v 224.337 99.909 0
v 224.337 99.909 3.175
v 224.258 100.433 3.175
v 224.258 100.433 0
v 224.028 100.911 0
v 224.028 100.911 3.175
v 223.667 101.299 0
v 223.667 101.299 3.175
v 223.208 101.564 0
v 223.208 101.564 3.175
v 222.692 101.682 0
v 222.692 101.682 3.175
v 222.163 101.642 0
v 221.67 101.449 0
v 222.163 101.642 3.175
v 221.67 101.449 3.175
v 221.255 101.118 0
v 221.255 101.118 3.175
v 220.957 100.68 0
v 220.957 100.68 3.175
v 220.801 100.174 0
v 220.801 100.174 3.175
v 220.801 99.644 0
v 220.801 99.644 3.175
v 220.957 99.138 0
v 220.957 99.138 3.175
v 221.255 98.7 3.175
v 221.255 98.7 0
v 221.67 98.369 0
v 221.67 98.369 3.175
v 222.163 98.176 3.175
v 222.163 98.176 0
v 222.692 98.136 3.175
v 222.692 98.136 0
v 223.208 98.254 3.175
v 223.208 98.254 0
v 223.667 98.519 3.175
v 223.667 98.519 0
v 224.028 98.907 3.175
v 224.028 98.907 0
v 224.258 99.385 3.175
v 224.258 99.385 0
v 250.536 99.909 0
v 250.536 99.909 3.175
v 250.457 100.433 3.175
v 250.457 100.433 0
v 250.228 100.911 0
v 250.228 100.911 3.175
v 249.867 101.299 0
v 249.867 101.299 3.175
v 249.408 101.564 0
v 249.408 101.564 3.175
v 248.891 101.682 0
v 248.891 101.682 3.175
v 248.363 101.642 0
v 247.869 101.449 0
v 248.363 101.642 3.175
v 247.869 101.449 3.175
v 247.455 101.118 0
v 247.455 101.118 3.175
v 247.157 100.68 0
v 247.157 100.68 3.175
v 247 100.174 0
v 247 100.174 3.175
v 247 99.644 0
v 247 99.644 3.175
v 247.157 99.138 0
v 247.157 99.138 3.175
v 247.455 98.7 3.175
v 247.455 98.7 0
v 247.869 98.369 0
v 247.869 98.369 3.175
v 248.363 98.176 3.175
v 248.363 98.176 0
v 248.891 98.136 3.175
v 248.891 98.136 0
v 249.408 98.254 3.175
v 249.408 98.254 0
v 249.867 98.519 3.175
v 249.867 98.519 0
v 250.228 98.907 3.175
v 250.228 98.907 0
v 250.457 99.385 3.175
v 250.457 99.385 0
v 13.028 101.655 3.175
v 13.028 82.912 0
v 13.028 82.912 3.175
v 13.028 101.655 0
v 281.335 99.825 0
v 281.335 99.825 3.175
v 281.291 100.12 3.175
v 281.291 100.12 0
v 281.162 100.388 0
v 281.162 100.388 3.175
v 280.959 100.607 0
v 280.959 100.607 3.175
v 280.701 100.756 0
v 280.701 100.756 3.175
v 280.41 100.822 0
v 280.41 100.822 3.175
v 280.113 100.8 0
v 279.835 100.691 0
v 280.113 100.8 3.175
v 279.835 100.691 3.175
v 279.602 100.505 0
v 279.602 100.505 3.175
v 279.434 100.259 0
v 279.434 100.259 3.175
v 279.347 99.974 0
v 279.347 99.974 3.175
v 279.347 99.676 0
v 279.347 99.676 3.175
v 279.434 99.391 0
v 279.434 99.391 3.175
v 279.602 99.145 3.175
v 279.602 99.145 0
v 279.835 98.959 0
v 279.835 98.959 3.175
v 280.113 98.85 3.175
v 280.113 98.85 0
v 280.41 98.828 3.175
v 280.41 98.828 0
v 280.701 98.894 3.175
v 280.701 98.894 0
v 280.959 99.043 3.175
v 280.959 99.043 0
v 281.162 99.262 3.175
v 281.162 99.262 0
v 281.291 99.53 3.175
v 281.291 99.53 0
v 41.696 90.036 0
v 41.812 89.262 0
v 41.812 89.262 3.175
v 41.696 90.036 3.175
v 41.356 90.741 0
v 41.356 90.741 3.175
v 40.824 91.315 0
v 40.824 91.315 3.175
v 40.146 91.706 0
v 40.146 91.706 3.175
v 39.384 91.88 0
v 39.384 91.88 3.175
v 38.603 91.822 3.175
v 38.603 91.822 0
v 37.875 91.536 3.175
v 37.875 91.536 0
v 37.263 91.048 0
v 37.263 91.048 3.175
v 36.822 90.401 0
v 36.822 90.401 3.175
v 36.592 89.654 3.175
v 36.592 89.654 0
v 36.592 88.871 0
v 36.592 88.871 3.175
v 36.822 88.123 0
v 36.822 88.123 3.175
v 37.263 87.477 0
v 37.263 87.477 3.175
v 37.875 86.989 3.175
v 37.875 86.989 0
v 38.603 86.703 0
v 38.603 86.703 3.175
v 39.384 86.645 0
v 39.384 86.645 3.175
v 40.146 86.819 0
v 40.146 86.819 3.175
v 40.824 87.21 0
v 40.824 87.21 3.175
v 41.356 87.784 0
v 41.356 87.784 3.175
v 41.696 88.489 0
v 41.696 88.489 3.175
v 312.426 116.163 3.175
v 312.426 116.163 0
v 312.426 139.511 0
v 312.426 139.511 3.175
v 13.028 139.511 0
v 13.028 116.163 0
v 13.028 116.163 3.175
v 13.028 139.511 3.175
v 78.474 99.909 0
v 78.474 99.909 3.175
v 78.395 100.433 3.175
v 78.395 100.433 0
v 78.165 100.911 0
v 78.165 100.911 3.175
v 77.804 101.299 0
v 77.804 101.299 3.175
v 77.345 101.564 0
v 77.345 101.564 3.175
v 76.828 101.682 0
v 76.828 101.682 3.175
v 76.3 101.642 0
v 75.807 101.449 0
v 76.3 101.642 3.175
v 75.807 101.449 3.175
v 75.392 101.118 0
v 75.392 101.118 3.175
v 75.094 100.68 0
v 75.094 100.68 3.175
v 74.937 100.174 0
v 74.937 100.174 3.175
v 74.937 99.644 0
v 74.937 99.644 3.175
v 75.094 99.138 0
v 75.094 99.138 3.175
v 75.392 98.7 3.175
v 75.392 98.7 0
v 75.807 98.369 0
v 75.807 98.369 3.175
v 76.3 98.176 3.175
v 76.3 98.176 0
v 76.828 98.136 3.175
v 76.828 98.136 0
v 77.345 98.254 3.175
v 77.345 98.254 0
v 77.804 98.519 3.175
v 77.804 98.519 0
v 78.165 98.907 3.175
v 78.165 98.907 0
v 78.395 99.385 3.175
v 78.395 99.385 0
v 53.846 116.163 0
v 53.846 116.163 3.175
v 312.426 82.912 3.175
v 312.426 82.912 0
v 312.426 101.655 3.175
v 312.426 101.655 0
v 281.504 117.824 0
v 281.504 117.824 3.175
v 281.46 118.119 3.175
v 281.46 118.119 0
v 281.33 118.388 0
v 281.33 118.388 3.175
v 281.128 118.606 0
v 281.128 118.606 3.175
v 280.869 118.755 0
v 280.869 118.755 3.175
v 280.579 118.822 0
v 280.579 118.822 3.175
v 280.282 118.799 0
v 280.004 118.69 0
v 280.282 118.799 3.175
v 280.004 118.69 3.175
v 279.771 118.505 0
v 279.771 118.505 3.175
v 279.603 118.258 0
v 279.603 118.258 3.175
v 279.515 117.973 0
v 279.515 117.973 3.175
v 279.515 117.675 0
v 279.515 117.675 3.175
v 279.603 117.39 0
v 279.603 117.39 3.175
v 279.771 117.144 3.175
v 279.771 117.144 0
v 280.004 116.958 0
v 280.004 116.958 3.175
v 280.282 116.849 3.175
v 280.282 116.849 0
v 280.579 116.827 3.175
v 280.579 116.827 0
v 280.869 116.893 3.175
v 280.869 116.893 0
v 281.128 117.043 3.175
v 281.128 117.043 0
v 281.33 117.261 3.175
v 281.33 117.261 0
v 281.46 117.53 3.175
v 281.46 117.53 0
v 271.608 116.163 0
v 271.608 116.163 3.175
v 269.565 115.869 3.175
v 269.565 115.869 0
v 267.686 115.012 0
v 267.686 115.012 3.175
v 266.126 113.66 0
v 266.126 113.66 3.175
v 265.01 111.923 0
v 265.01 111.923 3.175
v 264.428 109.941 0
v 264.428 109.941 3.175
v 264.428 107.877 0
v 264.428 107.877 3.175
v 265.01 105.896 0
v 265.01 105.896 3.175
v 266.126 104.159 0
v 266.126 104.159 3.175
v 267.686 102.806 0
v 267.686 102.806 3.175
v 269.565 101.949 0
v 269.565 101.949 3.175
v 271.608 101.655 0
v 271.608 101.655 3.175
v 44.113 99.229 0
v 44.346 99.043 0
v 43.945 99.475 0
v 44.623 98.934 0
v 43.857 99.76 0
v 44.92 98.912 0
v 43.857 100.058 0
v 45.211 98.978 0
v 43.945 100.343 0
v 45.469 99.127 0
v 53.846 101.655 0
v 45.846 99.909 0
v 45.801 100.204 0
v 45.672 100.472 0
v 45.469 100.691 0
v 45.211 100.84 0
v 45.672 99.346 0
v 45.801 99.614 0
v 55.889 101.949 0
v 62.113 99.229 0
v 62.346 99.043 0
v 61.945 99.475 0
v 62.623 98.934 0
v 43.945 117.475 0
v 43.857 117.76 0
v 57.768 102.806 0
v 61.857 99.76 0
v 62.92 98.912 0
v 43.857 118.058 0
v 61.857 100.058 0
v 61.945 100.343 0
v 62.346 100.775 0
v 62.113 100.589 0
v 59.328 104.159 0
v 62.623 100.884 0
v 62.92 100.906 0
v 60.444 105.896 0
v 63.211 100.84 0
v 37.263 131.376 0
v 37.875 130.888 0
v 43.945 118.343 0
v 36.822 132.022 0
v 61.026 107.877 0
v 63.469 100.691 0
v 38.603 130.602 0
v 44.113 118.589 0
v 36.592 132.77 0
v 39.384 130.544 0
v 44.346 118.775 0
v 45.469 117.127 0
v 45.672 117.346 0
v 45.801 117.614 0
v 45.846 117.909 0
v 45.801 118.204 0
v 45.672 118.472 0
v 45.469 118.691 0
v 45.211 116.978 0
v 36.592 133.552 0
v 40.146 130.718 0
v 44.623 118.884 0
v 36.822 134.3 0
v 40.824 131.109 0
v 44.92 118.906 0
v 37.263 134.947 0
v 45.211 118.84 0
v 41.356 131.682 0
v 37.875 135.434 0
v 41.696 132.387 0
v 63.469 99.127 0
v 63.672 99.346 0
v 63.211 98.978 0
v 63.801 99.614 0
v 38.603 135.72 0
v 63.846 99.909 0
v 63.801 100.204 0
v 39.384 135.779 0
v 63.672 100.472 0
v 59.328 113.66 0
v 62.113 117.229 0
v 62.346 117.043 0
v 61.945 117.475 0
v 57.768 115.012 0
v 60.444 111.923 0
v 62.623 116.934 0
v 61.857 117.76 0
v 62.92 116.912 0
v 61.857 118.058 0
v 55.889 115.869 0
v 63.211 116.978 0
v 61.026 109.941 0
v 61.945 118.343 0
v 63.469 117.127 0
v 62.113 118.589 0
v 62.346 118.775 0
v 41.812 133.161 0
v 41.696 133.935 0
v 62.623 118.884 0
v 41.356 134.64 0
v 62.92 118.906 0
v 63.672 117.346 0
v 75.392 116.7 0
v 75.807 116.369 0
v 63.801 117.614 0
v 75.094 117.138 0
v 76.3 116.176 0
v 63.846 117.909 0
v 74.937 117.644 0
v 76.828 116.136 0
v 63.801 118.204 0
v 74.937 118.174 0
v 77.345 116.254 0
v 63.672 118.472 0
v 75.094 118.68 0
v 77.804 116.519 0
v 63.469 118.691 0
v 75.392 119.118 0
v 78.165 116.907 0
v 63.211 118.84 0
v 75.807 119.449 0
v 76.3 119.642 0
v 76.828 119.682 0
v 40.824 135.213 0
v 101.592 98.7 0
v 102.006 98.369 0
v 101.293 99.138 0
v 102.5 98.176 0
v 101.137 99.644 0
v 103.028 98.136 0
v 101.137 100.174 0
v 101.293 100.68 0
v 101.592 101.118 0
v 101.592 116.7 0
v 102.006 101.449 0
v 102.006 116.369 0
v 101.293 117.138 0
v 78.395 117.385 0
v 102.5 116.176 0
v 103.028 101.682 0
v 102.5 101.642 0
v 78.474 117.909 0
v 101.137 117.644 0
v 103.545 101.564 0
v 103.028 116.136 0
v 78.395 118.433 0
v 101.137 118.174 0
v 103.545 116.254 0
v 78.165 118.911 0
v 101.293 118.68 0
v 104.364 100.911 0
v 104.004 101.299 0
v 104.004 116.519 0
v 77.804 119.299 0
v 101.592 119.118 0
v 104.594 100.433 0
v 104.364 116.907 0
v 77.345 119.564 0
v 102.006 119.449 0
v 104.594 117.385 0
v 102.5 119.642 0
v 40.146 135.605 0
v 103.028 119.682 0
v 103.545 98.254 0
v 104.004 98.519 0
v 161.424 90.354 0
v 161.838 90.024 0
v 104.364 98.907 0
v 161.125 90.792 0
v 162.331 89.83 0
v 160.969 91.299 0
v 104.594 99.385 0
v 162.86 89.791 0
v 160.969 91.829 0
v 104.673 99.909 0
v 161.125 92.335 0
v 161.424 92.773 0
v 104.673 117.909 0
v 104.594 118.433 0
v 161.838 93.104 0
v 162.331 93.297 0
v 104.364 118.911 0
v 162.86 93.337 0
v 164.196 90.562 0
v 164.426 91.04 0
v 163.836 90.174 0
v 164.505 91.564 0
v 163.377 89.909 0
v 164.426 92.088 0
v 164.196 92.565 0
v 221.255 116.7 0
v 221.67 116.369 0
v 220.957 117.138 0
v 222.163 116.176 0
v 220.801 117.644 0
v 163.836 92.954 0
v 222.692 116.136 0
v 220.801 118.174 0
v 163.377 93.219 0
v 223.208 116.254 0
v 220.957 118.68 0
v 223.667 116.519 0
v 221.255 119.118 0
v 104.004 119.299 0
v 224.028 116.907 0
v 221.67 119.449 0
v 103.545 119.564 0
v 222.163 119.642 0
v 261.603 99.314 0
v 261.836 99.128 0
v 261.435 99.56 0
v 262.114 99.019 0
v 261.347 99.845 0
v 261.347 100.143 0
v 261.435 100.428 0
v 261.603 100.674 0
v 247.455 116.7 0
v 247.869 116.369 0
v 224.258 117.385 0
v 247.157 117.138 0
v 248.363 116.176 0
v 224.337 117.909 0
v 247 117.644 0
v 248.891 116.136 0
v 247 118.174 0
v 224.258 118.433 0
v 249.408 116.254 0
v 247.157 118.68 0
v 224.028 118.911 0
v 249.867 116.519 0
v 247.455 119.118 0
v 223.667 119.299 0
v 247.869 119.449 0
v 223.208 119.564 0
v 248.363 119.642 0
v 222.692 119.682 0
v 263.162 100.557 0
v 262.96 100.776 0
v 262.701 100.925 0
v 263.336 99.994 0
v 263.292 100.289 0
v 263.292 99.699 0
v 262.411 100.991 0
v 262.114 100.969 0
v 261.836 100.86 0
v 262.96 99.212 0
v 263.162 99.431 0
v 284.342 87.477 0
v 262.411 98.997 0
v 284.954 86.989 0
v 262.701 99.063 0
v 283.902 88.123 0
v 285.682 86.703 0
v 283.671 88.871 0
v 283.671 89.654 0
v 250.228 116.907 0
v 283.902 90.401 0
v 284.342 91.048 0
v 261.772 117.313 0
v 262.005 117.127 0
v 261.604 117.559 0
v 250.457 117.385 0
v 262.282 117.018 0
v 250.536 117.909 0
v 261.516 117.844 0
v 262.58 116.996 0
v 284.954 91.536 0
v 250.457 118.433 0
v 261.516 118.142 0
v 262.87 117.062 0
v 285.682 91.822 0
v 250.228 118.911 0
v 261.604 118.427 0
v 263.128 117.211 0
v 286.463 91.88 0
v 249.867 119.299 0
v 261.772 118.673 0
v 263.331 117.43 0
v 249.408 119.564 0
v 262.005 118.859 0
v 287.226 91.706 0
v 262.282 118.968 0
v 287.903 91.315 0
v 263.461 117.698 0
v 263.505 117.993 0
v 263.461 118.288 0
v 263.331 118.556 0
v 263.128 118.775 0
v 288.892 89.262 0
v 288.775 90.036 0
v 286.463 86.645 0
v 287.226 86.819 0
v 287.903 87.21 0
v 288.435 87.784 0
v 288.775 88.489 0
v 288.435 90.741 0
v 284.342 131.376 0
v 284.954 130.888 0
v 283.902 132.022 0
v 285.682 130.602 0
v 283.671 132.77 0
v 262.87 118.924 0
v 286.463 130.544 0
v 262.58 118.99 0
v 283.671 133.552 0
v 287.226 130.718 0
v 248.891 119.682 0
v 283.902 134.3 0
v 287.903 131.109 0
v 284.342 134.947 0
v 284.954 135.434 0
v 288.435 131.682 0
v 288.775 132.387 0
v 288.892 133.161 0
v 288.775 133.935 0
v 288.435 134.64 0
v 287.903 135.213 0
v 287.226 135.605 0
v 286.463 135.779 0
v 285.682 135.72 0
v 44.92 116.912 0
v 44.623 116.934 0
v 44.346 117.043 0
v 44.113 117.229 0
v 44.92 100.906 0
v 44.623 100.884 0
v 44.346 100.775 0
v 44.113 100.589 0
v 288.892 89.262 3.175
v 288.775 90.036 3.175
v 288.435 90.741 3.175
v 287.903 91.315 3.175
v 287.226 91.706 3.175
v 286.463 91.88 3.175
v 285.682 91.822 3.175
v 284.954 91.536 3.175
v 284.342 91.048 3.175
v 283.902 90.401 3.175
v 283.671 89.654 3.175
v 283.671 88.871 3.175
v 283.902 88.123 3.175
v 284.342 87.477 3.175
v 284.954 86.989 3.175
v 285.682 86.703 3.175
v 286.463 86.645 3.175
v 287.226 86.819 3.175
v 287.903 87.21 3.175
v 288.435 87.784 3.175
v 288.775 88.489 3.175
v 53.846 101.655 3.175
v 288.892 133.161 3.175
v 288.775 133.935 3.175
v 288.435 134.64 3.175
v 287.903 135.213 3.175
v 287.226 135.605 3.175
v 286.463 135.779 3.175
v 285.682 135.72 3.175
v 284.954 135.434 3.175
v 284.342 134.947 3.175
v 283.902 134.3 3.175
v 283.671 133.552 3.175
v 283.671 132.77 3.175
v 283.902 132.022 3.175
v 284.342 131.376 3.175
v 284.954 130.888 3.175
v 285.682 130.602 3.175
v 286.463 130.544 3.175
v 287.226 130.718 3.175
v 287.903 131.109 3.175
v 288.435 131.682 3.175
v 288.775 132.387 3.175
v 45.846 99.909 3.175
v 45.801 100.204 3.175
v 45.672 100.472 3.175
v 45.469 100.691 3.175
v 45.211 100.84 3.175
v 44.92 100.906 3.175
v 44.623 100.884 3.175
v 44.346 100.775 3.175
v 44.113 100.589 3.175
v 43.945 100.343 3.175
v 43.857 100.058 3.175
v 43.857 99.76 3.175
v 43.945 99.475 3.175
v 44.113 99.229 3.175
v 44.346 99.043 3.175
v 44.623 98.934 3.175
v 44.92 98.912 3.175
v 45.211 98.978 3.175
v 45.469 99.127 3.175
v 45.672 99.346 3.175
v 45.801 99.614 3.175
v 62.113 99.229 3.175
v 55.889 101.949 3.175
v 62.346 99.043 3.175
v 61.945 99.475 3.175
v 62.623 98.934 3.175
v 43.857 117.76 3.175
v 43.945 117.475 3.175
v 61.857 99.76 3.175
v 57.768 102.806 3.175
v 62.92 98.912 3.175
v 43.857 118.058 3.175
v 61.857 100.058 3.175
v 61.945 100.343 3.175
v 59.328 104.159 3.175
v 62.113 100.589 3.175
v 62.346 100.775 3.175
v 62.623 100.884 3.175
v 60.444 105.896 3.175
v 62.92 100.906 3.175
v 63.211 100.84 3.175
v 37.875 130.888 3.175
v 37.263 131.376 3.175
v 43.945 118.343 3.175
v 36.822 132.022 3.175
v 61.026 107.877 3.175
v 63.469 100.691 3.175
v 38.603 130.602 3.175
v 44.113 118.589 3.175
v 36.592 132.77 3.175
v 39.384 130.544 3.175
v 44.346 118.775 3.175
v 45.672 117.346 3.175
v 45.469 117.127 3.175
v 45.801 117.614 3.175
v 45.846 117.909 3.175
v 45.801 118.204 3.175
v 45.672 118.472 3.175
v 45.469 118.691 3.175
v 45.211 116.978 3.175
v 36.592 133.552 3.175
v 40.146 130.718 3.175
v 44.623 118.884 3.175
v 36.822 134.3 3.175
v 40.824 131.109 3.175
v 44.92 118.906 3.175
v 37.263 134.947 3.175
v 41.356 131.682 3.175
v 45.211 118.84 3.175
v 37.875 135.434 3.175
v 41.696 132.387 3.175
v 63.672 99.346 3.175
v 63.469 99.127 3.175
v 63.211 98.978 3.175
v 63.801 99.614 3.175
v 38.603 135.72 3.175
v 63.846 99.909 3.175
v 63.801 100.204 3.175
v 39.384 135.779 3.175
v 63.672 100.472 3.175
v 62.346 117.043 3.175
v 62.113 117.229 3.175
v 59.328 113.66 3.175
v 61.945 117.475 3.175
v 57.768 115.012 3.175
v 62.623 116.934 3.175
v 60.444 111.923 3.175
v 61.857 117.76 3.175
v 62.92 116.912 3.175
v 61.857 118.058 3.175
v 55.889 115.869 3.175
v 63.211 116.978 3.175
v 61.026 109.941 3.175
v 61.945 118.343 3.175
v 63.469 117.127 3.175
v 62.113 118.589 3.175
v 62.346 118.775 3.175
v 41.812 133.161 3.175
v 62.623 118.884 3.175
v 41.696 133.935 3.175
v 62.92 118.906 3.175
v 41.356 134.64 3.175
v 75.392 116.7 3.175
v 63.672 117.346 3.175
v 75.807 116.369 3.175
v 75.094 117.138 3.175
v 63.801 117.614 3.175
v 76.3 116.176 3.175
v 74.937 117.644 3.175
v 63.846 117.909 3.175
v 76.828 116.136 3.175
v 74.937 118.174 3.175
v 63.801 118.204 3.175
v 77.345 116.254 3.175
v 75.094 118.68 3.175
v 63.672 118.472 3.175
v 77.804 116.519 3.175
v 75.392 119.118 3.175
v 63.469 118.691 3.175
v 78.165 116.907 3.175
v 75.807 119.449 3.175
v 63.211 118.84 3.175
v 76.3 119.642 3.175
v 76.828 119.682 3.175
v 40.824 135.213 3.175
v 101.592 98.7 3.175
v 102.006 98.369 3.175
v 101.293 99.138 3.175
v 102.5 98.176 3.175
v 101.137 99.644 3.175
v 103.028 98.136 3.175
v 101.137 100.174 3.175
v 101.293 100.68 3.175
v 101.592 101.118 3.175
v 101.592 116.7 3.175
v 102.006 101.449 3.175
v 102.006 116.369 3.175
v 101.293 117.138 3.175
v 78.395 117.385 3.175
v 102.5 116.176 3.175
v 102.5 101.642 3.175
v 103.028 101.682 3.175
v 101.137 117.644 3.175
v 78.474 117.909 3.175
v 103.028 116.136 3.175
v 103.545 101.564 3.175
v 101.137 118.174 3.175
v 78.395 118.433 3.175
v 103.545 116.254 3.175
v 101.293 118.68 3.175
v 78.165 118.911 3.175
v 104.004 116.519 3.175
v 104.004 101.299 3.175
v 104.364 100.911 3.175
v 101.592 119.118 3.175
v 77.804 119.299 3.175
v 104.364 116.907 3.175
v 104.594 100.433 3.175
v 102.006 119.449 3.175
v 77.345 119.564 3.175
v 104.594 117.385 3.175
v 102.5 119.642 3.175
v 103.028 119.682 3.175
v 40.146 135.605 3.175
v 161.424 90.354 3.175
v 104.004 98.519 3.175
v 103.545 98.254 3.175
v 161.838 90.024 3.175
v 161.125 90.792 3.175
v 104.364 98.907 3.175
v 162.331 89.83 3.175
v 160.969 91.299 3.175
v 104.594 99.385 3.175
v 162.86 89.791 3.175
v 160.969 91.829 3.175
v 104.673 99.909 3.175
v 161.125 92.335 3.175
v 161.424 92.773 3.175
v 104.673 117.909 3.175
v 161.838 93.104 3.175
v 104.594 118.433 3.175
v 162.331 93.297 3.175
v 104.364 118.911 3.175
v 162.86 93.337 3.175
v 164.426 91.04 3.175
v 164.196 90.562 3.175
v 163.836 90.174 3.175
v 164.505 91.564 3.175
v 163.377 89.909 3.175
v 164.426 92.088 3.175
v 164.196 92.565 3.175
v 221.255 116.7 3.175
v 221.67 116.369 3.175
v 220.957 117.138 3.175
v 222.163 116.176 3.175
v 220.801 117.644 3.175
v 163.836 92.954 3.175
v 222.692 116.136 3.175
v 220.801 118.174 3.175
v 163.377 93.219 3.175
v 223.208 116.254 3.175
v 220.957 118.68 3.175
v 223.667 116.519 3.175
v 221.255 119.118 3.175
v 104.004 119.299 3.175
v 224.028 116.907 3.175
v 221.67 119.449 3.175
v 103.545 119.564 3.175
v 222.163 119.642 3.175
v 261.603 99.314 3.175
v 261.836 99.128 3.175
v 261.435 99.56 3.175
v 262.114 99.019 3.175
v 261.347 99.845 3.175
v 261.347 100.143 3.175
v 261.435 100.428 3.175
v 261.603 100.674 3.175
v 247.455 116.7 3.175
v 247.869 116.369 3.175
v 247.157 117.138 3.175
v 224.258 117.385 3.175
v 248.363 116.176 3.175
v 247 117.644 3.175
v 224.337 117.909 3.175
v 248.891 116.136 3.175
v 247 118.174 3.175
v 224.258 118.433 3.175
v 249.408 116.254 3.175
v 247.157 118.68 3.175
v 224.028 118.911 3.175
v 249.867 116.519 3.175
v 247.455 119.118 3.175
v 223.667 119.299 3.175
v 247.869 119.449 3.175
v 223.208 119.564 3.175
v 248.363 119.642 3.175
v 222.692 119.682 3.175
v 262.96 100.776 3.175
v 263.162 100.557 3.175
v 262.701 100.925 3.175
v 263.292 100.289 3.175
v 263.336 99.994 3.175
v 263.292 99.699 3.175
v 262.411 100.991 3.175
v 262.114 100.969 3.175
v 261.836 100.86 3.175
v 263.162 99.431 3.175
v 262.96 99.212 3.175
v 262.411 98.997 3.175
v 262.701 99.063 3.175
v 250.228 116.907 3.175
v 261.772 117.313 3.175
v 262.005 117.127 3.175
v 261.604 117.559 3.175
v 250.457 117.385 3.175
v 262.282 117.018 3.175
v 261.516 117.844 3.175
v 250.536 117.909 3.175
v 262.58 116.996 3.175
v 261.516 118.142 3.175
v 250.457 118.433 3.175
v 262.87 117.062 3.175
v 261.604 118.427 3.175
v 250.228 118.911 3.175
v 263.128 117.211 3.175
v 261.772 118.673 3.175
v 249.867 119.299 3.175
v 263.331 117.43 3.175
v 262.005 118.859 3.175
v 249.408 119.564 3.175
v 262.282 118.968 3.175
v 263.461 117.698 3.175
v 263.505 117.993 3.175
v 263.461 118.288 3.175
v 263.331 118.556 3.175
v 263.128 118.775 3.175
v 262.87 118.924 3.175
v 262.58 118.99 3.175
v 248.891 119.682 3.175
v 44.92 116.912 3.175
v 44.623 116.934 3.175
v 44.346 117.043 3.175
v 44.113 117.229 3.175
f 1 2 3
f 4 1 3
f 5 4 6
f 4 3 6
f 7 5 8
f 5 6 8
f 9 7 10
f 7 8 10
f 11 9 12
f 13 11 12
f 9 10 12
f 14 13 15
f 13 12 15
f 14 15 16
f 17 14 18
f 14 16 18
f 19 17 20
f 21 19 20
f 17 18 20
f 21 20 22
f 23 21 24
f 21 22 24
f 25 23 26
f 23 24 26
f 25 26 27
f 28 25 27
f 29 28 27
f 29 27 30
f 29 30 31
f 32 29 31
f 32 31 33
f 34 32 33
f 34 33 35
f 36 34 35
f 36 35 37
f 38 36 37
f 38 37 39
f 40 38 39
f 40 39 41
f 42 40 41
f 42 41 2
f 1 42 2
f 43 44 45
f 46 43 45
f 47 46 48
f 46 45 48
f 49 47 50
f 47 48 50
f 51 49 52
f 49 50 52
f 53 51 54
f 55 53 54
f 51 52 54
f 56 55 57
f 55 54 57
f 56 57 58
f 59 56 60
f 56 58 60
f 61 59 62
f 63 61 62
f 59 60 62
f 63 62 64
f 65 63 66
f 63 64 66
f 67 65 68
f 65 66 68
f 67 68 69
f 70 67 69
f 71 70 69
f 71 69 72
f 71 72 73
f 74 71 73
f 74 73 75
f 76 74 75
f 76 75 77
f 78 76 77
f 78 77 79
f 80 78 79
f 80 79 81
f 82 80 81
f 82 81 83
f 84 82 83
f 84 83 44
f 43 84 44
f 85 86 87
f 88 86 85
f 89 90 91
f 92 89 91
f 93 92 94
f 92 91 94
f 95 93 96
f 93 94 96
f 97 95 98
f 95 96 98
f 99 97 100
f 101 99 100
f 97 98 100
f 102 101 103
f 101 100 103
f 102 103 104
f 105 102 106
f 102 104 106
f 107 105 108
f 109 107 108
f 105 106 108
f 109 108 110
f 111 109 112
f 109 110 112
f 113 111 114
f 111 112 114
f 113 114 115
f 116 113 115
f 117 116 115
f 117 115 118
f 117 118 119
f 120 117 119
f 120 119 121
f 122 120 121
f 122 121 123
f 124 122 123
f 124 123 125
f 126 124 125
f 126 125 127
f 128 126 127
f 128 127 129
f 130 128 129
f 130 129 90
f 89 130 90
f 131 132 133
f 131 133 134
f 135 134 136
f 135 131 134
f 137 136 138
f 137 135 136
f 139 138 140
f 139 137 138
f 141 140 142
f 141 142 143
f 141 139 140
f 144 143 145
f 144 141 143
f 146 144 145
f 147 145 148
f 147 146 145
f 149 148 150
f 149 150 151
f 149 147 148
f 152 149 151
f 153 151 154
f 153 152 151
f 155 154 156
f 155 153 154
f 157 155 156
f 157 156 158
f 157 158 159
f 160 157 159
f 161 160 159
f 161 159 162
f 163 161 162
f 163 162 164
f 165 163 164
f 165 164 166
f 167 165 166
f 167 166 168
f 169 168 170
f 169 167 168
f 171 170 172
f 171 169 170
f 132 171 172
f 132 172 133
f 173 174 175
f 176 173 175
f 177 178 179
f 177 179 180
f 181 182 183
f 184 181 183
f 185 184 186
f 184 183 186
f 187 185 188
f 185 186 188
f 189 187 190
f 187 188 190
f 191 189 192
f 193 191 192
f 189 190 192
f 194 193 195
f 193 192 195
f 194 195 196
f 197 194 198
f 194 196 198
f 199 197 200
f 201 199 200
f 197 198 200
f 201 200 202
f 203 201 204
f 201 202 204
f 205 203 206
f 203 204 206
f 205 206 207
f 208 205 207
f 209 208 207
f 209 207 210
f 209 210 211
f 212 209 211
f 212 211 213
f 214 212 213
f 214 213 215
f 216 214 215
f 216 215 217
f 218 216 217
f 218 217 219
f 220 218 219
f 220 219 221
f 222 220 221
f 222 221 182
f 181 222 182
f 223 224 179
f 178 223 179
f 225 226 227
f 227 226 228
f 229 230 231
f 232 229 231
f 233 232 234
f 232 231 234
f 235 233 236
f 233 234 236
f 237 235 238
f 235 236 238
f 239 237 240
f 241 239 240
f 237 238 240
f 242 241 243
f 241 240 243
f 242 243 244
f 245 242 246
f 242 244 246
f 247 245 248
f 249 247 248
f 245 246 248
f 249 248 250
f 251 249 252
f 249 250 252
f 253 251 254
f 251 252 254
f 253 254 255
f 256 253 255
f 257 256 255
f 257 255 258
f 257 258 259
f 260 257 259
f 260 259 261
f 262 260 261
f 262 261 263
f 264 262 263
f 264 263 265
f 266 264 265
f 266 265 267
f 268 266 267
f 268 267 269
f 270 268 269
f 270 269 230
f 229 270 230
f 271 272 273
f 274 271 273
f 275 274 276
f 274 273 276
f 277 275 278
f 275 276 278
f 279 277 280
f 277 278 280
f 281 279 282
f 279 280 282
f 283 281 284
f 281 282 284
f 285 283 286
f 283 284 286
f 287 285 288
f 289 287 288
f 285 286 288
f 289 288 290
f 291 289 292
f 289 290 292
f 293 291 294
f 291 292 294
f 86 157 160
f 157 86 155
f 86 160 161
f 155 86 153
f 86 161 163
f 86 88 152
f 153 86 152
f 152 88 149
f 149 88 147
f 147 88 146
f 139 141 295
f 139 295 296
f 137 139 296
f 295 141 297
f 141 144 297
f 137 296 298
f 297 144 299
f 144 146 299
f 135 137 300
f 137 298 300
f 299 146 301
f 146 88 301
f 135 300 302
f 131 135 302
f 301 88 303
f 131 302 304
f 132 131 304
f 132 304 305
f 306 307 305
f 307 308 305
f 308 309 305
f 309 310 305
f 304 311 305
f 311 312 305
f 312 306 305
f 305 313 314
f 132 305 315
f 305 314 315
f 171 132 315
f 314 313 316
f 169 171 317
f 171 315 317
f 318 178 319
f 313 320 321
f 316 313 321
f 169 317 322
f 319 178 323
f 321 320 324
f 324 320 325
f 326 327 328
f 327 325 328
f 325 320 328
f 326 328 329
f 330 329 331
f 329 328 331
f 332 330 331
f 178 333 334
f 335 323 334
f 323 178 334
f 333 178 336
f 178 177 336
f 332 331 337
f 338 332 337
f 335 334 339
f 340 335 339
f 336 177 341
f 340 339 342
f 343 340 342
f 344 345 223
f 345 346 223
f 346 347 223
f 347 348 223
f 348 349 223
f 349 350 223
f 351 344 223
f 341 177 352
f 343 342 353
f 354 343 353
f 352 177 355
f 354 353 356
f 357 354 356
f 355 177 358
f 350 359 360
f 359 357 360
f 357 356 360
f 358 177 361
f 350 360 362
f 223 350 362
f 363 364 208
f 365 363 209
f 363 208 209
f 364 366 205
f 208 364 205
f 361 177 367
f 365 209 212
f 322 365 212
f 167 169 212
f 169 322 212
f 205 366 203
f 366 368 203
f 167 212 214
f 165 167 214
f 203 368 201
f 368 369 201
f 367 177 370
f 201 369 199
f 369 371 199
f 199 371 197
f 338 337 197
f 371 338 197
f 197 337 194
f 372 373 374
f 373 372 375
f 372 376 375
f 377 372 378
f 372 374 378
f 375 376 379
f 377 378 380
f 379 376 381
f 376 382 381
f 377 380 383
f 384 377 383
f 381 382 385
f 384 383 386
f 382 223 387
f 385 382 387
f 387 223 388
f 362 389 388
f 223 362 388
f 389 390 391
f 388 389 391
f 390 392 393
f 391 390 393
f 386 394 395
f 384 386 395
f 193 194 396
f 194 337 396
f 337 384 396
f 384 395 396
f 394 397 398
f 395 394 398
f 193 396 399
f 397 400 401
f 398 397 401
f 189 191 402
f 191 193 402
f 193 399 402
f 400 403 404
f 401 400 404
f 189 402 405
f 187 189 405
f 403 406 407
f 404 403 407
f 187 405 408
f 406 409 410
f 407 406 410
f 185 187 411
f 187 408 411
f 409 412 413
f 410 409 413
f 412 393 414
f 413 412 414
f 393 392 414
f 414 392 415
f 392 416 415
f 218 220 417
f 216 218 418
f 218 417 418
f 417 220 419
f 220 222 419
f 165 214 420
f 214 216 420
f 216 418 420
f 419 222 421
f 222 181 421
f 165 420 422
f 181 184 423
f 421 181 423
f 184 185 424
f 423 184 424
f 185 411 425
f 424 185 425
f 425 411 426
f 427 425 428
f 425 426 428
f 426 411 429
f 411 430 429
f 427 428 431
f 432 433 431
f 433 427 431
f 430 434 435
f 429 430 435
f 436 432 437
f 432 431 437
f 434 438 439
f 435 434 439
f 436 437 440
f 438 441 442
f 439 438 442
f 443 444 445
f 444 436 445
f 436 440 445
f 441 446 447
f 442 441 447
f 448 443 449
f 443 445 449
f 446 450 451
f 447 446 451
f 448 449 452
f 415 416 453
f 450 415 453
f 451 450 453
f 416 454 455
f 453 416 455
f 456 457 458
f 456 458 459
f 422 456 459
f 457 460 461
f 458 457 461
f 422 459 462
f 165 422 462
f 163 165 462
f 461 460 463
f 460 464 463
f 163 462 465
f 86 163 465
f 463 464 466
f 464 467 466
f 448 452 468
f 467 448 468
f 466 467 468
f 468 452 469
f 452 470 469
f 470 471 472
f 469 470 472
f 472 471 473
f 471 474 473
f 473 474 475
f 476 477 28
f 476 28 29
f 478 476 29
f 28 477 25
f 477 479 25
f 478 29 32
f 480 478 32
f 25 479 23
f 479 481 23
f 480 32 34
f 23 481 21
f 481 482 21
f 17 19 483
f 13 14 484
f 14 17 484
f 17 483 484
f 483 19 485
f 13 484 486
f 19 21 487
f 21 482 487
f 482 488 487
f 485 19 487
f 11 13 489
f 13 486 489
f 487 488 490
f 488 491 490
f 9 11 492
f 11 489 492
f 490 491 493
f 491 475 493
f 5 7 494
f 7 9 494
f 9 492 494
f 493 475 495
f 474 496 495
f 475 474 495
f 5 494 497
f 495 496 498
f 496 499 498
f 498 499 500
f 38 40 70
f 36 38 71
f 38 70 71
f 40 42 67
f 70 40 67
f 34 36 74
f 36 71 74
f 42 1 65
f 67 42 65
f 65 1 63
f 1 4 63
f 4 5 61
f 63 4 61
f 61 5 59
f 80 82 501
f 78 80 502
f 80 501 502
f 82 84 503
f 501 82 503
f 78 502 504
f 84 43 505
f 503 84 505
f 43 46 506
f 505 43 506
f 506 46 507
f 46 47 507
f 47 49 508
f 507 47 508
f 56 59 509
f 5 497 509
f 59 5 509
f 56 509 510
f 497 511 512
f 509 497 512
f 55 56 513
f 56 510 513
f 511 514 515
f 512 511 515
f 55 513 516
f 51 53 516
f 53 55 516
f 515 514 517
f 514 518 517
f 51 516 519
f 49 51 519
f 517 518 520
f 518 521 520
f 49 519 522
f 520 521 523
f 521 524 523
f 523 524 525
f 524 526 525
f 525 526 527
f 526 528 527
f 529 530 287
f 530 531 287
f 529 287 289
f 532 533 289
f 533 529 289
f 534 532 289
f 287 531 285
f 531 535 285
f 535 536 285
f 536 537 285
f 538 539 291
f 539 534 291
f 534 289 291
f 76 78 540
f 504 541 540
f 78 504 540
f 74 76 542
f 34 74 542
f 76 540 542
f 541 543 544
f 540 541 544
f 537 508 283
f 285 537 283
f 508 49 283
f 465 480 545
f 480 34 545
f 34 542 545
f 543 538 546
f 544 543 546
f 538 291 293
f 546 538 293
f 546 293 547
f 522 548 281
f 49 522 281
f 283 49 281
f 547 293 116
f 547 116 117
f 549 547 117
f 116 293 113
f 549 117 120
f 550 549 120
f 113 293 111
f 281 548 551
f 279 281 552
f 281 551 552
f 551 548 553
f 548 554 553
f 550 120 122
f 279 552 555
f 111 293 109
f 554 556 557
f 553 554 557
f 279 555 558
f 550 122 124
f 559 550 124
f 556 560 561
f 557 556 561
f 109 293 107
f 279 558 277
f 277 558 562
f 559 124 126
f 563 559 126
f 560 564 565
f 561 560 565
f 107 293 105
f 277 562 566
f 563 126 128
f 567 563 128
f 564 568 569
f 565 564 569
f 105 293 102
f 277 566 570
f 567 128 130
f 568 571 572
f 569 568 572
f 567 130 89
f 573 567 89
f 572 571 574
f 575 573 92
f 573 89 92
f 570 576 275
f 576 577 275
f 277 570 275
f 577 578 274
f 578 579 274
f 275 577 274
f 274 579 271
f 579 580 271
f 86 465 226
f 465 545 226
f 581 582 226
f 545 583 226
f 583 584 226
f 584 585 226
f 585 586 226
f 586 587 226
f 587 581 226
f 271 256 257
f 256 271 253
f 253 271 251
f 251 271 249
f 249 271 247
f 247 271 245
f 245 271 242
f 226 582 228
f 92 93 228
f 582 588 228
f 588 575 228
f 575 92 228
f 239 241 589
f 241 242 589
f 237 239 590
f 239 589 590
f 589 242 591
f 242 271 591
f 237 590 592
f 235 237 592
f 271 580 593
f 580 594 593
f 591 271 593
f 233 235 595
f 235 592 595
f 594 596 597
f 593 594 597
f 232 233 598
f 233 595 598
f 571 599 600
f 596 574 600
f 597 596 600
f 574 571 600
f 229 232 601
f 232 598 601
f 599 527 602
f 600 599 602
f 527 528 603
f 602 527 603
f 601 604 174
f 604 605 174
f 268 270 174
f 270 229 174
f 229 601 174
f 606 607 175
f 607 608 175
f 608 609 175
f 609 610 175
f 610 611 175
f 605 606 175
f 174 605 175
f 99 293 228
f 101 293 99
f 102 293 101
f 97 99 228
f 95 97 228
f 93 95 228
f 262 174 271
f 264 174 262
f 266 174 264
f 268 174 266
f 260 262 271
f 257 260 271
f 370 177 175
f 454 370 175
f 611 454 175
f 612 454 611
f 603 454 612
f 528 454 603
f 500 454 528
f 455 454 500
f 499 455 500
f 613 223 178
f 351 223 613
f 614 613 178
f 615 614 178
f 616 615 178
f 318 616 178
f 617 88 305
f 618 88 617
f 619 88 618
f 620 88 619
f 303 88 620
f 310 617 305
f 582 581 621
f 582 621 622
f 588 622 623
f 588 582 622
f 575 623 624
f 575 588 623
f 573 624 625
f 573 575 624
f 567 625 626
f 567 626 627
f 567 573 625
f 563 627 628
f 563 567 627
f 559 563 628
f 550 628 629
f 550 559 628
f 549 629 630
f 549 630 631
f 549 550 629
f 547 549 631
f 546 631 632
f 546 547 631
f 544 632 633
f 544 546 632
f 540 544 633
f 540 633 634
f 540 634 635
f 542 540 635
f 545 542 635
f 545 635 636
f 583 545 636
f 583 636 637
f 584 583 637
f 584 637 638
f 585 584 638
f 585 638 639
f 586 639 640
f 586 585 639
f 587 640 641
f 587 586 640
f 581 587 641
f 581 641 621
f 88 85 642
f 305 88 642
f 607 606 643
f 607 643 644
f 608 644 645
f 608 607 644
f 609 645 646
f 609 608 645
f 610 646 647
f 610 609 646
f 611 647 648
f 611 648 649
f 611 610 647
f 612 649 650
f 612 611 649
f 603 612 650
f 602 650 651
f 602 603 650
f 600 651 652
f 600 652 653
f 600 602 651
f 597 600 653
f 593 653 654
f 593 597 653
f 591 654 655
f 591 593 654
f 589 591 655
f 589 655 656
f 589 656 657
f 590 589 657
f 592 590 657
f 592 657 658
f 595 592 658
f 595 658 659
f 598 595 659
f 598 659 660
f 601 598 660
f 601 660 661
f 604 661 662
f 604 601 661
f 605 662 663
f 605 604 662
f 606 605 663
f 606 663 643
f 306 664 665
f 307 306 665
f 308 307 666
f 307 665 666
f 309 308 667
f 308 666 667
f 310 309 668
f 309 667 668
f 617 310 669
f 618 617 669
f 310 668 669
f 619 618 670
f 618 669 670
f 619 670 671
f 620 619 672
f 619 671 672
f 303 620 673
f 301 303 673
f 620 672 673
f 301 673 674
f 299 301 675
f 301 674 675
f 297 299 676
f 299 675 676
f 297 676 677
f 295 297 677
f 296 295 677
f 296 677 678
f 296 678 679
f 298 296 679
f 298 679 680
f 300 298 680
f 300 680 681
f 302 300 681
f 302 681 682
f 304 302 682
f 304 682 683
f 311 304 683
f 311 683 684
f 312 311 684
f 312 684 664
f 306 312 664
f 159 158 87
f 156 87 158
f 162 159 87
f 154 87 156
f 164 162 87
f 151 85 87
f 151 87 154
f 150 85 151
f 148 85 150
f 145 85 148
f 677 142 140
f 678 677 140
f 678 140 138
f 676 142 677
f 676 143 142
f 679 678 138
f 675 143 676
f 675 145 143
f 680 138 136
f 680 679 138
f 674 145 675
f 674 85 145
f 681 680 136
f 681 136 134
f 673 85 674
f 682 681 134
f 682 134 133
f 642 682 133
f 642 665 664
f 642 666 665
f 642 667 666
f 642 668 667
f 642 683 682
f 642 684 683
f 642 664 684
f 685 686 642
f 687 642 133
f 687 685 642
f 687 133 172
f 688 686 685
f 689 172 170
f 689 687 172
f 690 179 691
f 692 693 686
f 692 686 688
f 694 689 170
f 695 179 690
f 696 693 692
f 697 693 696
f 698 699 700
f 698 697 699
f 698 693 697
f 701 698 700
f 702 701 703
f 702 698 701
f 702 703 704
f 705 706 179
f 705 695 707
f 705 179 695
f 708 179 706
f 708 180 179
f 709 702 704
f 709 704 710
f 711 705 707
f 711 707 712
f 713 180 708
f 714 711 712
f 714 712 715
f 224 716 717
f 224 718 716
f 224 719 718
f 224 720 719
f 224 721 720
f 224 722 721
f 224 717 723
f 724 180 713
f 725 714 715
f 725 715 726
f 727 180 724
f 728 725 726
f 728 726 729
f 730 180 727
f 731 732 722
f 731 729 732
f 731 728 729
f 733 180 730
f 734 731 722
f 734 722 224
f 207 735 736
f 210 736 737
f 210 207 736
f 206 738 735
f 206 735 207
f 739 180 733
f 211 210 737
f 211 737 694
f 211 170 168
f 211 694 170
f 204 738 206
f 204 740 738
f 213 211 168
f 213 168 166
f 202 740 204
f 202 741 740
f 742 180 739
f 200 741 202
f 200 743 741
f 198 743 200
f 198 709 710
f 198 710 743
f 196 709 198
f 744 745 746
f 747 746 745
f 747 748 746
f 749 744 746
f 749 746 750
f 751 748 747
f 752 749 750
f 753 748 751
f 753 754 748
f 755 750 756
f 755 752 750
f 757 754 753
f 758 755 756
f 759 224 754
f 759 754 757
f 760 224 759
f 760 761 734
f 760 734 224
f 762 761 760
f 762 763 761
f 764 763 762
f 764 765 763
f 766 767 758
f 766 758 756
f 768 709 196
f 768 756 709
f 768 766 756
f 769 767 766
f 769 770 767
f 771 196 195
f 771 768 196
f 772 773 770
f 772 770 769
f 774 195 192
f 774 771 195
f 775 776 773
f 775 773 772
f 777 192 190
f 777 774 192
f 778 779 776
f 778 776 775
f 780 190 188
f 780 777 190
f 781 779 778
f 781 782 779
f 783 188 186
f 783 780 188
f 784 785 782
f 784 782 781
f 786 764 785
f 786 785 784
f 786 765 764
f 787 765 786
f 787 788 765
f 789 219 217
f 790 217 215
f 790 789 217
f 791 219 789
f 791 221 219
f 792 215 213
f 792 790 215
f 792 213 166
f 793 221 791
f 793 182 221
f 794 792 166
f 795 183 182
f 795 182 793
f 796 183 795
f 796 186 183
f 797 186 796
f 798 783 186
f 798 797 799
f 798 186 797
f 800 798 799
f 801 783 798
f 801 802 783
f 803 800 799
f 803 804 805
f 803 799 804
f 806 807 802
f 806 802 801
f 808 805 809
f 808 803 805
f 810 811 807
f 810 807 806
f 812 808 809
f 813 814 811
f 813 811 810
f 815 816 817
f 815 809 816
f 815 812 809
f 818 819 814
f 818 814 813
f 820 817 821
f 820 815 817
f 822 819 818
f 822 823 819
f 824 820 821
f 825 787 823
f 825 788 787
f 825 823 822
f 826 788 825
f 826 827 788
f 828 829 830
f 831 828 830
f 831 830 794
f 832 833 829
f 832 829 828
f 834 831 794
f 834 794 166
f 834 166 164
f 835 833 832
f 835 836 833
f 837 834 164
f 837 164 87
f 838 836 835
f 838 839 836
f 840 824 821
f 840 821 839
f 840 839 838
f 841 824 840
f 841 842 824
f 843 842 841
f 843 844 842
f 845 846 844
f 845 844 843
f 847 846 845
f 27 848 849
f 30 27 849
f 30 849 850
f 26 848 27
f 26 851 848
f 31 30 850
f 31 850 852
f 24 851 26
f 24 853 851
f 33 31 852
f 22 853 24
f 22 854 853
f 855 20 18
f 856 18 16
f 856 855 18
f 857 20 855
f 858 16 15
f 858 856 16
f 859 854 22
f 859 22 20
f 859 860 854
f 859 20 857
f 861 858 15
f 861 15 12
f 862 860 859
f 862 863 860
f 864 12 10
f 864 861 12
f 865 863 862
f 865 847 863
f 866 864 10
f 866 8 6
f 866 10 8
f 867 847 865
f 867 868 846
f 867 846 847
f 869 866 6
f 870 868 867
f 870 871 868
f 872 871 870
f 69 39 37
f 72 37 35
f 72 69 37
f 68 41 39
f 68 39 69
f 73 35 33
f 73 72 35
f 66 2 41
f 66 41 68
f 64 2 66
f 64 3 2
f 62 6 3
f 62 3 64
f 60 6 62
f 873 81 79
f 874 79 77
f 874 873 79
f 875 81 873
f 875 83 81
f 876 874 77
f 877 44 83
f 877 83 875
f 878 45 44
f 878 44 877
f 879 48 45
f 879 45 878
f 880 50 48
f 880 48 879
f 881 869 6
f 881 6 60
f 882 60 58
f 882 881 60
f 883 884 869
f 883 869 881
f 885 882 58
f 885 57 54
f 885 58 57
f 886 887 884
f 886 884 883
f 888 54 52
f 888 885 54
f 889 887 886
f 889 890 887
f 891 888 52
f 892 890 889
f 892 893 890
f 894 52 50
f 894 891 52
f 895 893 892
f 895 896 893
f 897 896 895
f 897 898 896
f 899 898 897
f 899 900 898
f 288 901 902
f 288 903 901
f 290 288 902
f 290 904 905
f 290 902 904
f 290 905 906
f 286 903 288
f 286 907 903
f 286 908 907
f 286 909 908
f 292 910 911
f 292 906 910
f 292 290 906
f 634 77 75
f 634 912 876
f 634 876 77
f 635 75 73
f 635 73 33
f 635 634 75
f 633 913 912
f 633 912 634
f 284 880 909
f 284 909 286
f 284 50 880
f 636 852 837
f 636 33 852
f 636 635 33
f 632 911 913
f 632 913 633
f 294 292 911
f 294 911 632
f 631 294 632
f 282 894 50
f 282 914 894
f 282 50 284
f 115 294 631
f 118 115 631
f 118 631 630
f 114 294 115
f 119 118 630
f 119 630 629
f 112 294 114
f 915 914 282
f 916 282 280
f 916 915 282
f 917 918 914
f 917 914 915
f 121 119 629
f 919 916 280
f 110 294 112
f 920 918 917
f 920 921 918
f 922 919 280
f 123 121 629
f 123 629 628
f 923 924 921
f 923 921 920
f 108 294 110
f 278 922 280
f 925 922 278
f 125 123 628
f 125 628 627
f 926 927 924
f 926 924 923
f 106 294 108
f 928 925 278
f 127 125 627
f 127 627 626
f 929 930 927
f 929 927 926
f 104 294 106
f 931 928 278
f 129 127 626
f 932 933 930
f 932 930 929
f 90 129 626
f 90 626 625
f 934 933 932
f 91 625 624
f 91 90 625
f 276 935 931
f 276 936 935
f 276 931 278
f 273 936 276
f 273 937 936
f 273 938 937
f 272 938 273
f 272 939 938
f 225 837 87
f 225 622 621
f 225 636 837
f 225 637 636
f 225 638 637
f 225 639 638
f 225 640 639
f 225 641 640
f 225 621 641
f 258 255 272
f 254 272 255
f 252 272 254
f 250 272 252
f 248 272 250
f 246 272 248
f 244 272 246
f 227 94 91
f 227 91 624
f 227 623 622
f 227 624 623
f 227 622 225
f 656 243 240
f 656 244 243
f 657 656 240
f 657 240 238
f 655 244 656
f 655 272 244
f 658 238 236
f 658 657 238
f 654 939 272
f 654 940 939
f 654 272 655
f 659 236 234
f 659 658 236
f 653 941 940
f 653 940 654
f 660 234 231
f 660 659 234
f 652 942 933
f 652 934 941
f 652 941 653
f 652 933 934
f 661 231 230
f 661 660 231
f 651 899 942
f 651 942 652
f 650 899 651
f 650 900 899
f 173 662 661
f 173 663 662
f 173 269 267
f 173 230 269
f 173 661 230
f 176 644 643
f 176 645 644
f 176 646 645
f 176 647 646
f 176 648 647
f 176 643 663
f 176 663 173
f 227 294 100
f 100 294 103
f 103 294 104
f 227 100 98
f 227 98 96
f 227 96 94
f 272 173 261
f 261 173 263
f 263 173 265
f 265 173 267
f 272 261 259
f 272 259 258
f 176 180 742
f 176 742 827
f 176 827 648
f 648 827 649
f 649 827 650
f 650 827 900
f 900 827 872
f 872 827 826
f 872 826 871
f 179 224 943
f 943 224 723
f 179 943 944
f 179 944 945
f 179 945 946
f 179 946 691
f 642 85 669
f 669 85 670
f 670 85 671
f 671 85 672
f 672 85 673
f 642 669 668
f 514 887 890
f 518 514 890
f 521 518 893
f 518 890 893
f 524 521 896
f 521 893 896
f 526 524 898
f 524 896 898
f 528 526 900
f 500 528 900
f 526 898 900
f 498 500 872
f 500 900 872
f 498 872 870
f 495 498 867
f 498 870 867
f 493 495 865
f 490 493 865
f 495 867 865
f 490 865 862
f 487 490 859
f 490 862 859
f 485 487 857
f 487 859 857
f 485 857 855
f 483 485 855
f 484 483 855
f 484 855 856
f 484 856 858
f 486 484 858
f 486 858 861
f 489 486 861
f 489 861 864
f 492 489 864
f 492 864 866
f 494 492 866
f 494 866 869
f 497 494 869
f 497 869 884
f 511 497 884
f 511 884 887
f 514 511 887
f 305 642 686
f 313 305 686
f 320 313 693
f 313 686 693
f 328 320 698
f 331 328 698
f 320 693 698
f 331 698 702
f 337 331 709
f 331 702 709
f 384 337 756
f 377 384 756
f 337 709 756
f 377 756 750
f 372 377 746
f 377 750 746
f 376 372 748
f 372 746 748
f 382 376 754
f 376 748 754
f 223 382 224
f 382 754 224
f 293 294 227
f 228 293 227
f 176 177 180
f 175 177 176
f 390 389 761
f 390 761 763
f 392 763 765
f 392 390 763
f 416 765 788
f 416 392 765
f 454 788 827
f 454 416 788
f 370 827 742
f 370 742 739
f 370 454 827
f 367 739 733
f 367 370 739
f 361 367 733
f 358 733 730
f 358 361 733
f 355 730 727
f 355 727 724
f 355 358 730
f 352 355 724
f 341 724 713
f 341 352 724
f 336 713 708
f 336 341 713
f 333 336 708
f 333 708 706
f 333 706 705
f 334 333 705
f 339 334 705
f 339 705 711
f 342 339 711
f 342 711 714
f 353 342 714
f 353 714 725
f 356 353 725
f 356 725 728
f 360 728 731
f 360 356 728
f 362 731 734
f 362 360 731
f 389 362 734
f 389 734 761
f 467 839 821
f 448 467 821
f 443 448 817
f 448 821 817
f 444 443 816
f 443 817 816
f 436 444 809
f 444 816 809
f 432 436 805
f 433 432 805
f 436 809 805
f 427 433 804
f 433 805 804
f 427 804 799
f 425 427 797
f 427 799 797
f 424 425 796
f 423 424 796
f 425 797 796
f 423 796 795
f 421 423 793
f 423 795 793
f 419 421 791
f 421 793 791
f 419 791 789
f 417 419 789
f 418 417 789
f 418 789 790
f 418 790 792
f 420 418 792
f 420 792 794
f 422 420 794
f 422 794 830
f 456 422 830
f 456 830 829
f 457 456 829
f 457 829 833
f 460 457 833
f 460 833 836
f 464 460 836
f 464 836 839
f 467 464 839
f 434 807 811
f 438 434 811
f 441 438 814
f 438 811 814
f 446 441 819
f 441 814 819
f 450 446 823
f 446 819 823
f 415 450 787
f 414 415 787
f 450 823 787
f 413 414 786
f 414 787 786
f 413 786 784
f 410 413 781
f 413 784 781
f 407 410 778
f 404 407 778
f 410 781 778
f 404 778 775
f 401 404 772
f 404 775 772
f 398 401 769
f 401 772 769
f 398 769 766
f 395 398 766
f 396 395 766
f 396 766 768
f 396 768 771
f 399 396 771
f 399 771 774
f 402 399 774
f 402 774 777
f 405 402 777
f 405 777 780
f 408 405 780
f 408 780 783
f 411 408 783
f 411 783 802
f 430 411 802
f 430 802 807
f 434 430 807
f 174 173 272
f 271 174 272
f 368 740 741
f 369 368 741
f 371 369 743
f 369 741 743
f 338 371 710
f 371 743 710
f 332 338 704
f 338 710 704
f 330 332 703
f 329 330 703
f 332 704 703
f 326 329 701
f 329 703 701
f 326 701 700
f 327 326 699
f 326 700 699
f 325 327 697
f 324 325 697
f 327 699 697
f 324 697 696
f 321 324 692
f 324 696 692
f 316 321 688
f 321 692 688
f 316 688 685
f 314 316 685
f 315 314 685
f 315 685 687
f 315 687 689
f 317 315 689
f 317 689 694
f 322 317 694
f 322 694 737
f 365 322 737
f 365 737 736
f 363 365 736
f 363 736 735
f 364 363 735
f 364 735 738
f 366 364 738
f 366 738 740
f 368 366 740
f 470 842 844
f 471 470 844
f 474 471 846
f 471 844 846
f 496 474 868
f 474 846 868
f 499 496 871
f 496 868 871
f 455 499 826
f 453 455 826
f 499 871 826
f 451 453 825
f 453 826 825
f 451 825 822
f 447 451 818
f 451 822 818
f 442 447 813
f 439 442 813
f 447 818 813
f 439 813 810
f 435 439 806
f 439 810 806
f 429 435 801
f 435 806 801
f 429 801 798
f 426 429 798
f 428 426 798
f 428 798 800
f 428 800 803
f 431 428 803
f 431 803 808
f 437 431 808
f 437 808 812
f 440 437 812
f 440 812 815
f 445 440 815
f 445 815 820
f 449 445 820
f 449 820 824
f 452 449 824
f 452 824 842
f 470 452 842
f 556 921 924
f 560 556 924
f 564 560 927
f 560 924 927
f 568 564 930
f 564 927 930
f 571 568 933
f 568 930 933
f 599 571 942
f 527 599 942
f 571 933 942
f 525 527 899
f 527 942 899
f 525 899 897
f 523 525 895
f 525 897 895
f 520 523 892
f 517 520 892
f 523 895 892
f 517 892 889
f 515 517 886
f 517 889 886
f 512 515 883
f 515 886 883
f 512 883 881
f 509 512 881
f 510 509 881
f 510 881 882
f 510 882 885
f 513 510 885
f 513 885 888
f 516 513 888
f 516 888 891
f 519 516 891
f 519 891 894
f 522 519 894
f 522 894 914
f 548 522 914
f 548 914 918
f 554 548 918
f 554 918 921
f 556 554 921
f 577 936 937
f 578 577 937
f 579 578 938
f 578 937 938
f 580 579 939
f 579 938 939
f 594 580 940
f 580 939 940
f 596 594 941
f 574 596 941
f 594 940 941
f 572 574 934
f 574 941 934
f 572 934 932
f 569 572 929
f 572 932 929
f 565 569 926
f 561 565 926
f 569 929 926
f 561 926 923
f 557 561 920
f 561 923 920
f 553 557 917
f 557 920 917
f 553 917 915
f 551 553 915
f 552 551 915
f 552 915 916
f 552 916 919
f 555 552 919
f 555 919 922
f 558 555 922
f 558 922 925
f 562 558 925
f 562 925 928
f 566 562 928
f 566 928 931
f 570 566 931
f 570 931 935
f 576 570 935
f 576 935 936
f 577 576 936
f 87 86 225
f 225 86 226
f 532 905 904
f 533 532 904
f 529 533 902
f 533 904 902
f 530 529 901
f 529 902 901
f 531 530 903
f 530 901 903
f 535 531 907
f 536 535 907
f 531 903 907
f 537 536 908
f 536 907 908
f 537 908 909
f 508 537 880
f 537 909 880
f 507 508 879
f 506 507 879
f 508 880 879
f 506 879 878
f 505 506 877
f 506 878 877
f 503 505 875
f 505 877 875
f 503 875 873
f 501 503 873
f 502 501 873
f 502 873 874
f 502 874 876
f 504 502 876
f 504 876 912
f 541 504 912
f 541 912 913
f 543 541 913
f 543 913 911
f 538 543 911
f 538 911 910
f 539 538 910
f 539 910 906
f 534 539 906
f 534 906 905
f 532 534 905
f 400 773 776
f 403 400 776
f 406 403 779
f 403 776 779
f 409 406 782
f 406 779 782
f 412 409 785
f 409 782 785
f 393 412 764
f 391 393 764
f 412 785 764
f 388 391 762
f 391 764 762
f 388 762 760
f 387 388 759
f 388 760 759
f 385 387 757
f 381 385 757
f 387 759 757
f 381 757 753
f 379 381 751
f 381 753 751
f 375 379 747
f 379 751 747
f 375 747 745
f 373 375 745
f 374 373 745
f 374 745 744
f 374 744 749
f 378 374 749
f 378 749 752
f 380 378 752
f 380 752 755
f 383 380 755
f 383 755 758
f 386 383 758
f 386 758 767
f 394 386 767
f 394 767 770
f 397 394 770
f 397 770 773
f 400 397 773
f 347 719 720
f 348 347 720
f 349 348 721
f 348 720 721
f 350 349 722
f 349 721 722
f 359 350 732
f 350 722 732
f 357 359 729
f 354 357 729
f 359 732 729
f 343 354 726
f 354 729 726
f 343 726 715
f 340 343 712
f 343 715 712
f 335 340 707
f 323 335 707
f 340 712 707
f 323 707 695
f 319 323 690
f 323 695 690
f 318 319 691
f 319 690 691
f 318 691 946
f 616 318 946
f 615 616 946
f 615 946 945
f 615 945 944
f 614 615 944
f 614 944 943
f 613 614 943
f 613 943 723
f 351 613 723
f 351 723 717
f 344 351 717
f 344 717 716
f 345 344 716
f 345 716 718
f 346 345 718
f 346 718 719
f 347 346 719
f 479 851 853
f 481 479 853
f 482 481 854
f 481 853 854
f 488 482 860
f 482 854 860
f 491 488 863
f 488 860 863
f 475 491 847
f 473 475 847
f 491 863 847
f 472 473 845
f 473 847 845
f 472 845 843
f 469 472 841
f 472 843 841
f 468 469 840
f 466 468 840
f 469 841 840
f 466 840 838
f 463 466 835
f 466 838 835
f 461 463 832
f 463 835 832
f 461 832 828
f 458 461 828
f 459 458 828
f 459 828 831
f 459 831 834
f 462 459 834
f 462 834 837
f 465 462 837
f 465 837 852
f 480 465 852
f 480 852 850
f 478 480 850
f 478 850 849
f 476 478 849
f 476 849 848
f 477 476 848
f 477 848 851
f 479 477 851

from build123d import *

# Parameters (mm, degrees)
SKETCH1_W           = 299.398126018
SKETCH1_H           = 56.59882
SKETCH1_R           = 2.625
BOSS_EXTRUDE1_DEPTH = 3.175
SKETCH2_R           = 1
CUT_EXTRUDE1_DEPTH  = 4.175
SKETCH3_R           = 1.778
CUT_EXTRUDE2_DEPTH  = 4.175
CUT_EXTRUDE3_DEPTH  = 4.175


with BuildPart() as part:
    # Sketch1 → Boss-Extrude1 (new body)
    with BuildSketch(Plane.XY):
        with Locations((162.727004442, 111.211757818)):
            Rectangle(SKETCH1_W, SKETCH1_H)
        with Locations((286.266607451, 133.161167818)):
            Circle(SKETCH1_R, mode=Mode.SUBTRACT)
        with Locations((286.266607451, 89.262347818)):
            Circle(SKETCH1_R, mode=Mode.SUBTRACT)
        with Locations((39.187401433, 133.161167818)):
            Circle(SKETCH1_R, mode=Mode.SUBTRACT)
        with Locations((39.187401433, 89.262347818)):
            Circle(SKETCH1_R, mode=Mode.SUBTRACT)
    extrude(amount=BOSS_EXTRUDE1_DEPTH)

    # Sketch2 → Cut-Extrude1 (cut, through all)
    with BuildSketch(Plane.XY.offset(3.175)):
        with Locations((280.504156768, 117.824340674)):
            Circle(SKETCH2_R)
        with Locations((280.335334394, 99.825132385)):
            Circle(SKETCH2_R)
        with Locations((262.504948479, 117.993163047)):
            Circle(SKETCH2_R)
        with Locations((262.336126106, 99.993954759)):
            Circle(SKETCH2_R)
        with Locations((62.845741433, 117.909047818)):
            Circle(SKETCH2_R)
        with Locations((62.845741433, 99.909047818)):
            Circle(SKETCH2_R)
        with Locations((44.845741433, 117.909047818)):
            Circle(SKETCH2_R)
        with Locations((44.845741433, 99.909047818)):
            Circle(SKETCH2_R)
    extrude(amount=-CUT_EXTRUDE1_DEPTH, mode=Mode.SUBTRACT)

    # Sketch3 → Cut-Extrude2 (cut, through all)
    with BuildSketch(Plane.XY.offset(3.175)):
        with Locations((76.695557497, 117.909047818)):
            Circle(SKETCH3_R)
        with Locations((76.695557497, 99.909047818)):
            Circle(SKETCH3_R)
        with Locations((102.895189625, 117.909047818)):
            Circle(SKETCH3_R)
        with Locations((102.895189625, 99.909047818)):
            Circle(SKETCH3_R)
        with Locations((248.758451386, 99.909047818)):
            Circle(SKETCH3_R)
        with Locations((222.558819258, 99.909047818)):
            Circle(SKETCH3_R)
        with Locations((222.558819258, 117.909047818)):
            Circle(SKETCH3_R)
        with Locations((248.758451386, 117.909047818)):
            Circle(SKETCH3_R)
        with Locations((162.727004442, 91.563754554)):
            Circle(SKETCH3_R)
    extrude(amount=-CUT_EXTRUDE2_DEPTH, mode=Mode.SUBTRACT)

    # Sketch5 → Cut-Extrude3 (cut, through all)
    with BuildSketch(Plane.XY.offset(3.175)):
        with BuildLine():
            Line((53.845741433, 116.163287818), (13.027941433, 116.163287818))
            Line((13.027941433, 116.163287818), (13.027941433, 101.654807818))
            Line((13.027941433, 101.654807818), (53.845741433, 101.654807818))
            ThreePointArc((53.845741433, 101.654807818), (61.099981433, 108.909047818), (53.845741433, 116.163287818))
        make_face()
        with BuildLine():
            Line((271.608267451, 101.654807818), (312.426067451, 101.654807818))
            Line((312.426067451, 101.654807818), (312.426067451, 116.163287818))
            Line((312.426067451, 116.163287818), (271.608267451, 116.163287818))
            ThreePointArc((271.608267451, 116.163287818), (264.354027451, 108.909047818), (271.608267451, 101.654807818))
        make_face()
    extrude(amount=-CUT_EXTRUDE3_DEPTH, mode=Mode.SUBTRACT)


solid = part.part
